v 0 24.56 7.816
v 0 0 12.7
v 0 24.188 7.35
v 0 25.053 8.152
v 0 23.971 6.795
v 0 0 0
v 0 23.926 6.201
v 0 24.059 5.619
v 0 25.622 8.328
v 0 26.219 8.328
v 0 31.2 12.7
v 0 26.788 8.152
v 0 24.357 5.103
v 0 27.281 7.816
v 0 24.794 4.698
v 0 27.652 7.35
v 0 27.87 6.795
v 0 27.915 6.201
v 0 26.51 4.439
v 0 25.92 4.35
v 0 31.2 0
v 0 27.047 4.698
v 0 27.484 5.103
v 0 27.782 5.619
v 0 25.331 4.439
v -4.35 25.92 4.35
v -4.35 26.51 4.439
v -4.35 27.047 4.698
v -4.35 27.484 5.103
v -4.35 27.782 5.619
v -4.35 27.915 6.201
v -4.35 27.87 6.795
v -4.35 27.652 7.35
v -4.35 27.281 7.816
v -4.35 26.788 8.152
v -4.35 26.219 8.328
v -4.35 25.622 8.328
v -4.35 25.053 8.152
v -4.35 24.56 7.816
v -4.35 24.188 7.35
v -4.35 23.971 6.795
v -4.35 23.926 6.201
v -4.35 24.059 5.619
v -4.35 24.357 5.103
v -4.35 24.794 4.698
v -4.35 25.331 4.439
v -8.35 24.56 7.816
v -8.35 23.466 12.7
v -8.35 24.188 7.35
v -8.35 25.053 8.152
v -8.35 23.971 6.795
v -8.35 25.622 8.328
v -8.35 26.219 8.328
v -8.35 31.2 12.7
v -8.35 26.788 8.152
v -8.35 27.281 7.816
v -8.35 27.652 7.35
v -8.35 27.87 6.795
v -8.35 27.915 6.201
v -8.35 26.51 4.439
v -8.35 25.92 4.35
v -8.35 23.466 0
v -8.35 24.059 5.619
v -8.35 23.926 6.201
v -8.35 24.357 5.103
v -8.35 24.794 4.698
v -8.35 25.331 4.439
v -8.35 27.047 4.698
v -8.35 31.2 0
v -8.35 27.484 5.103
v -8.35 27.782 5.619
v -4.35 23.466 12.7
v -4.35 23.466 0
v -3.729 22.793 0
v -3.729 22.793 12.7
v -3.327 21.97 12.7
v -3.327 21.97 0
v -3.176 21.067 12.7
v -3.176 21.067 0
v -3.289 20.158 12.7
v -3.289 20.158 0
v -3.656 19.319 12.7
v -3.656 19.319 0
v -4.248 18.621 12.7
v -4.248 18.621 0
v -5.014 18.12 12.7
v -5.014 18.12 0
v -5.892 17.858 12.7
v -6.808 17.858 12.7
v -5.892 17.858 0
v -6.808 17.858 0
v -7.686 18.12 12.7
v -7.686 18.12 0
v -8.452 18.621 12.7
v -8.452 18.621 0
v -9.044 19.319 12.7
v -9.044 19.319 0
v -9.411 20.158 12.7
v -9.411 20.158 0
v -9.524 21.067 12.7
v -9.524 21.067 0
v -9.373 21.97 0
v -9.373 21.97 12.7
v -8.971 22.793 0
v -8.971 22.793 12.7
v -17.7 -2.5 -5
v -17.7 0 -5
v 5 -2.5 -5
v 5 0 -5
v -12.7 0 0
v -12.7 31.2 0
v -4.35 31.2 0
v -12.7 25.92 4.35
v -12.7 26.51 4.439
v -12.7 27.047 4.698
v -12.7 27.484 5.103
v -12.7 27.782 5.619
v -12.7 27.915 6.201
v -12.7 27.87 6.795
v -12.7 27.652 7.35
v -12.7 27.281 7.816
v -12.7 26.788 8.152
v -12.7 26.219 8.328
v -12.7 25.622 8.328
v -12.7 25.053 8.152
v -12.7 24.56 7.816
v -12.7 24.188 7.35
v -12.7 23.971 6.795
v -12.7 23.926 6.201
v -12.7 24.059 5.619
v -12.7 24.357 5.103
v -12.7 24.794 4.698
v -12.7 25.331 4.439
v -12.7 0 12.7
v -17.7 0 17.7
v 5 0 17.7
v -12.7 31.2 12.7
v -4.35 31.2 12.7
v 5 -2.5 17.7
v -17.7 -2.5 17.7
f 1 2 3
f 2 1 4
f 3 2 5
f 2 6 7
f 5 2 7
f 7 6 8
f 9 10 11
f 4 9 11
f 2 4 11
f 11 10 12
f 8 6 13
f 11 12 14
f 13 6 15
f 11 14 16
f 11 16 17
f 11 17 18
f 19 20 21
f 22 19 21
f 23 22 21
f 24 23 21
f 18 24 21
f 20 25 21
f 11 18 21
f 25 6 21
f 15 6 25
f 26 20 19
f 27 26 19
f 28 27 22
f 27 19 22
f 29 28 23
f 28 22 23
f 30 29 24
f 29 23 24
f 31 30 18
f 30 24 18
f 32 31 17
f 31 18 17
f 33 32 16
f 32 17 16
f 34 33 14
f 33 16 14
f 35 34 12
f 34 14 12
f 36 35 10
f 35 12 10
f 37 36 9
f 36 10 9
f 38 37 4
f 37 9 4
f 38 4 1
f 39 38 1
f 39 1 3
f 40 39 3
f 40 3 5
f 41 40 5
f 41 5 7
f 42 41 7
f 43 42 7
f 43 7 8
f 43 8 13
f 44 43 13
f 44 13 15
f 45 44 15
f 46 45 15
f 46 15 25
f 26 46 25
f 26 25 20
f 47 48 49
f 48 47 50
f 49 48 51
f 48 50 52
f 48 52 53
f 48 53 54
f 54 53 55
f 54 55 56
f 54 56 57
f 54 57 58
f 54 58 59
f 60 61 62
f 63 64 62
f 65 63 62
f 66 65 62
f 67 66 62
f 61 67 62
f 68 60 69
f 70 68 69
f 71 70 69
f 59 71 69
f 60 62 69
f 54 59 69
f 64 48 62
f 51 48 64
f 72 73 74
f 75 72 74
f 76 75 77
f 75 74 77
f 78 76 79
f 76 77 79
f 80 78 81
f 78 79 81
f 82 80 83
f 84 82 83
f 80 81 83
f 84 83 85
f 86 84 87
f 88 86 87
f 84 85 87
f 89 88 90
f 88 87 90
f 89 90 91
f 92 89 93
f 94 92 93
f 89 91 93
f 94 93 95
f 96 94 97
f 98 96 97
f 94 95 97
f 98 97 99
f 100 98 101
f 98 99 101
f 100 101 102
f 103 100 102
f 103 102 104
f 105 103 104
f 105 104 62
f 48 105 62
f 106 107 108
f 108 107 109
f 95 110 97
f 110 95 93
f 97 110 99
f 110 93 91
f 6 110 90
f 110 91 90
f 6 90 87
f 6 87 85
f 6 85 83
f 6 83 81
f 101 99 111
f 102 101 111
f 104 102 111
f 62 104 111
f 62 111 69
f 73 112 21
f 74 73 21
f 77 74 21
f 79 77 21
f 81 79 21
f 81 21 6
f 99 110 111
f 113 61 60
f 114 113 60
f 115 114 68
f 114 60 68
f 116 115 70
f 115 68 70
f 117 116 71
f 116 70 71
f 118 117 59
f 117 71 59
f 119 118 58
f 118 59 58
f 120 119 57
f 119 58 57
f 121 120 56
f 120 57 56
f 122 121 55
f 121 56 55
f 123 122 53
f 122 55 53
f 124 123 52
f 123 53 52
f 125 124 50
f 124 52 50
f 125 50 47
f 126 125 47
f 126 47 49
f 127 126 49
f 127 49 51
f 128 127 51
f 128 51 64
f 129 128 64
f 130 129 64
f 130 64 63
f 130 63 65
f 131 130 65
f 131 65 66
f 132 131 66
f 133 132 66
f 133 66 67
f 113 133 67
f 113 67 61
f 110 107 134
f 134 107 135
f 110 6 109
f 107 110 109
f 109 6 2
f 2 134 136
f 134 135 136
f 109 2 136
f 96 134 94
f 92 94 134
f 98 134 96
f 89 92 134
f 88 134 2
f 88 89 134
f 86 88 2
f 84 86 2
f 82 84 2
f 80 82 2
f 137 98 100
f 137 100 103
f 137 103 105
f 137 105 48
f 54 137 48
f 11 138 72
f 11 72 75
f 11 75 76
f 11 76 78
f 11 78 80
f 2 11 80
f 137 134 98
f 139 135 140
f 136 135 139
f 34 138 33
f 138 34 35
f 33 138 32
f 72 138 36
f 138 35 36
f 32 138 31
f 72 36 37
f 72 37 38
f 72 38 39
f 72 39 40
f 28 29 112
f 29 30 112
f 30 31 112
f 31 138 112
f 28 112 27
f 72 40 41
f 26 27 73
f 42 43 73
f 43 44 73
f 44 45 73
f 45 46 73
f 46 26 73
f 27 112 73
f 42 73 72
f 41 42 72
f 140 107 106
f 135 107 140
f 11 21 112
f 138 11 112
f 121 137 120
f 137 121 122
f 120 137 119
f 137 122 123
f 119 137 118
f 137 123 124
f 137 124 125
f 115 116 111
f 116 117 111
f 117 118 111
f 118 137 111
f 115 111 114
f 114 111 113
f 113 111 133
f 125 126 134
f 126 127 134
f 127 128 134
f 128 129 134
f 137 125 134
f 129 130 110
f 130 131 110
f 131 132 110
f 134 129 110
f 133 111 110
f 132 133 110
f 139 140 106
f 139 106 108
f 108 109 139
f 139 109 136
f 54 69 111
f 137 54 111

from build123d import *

# Parameters (mm, degrees)
BOSS_EXTRUDE1_DEPTH = 12.7
SKETCH2_W           = 22.7
SKETCH2_H           = 22.7
BOSS_EXTRUDE2_DEPTH = 2.5
SKETCH3_R           = 2
CUT_EXTRUDE1_DEPTH  = 18.7


with BuildPart() as part:
    # Sketch1 → Boss-Extrude1 (new body)
    with BuildSketch(Plane.XY):
        with BuildLine():
            Line((0, 0), (0, 31.2))
            Line((0, 31.2), (-4.35, 31.2))
            Line((-4.35, 31.2), (-4.35, 23.465892333))
            ThreePointArc((-4.35, 23.465892333), (-6.35, 17.825), (-8.35, 23.465892333))
            Line((-8.35, 23.465892333), (-8.35, 31.2))
            Line((-8.35, 31.2), (-12.7, 31.2))
            Line((-12.7, 31.2), (-12.7, 0))
            Line((-12.7, 0), (0, 0))
        make_face()
    extrude(amount=BOSS_EXTRUDE1_DEPTH)

    # Sketch2 → Boss-Extrude2 (add)
    with BuildSketch(Plane.XZ):
        with Locations((-6.35, 6.35)):
            Rectangle(SKETCH2_W, SKETCH2_H)
    extrude(amount=BOSS_EXTRUDE2_DEPTH)

    # Sketch3 → Cut-Extrude1 (cut, through all)
    with BuildSketch(Plane(origin=(0, 0, 0), x_dir=(0, 0, -1), z_dir=(1, 0, 0))):
        with Locations((-6.35, 25.920446167)):
            Circle(SKETCH3_R)
    extrude(amount=-CUT_EXTRUDE1_DEPTH, mode=Mode.SUBTRACT)


solid = part.part
